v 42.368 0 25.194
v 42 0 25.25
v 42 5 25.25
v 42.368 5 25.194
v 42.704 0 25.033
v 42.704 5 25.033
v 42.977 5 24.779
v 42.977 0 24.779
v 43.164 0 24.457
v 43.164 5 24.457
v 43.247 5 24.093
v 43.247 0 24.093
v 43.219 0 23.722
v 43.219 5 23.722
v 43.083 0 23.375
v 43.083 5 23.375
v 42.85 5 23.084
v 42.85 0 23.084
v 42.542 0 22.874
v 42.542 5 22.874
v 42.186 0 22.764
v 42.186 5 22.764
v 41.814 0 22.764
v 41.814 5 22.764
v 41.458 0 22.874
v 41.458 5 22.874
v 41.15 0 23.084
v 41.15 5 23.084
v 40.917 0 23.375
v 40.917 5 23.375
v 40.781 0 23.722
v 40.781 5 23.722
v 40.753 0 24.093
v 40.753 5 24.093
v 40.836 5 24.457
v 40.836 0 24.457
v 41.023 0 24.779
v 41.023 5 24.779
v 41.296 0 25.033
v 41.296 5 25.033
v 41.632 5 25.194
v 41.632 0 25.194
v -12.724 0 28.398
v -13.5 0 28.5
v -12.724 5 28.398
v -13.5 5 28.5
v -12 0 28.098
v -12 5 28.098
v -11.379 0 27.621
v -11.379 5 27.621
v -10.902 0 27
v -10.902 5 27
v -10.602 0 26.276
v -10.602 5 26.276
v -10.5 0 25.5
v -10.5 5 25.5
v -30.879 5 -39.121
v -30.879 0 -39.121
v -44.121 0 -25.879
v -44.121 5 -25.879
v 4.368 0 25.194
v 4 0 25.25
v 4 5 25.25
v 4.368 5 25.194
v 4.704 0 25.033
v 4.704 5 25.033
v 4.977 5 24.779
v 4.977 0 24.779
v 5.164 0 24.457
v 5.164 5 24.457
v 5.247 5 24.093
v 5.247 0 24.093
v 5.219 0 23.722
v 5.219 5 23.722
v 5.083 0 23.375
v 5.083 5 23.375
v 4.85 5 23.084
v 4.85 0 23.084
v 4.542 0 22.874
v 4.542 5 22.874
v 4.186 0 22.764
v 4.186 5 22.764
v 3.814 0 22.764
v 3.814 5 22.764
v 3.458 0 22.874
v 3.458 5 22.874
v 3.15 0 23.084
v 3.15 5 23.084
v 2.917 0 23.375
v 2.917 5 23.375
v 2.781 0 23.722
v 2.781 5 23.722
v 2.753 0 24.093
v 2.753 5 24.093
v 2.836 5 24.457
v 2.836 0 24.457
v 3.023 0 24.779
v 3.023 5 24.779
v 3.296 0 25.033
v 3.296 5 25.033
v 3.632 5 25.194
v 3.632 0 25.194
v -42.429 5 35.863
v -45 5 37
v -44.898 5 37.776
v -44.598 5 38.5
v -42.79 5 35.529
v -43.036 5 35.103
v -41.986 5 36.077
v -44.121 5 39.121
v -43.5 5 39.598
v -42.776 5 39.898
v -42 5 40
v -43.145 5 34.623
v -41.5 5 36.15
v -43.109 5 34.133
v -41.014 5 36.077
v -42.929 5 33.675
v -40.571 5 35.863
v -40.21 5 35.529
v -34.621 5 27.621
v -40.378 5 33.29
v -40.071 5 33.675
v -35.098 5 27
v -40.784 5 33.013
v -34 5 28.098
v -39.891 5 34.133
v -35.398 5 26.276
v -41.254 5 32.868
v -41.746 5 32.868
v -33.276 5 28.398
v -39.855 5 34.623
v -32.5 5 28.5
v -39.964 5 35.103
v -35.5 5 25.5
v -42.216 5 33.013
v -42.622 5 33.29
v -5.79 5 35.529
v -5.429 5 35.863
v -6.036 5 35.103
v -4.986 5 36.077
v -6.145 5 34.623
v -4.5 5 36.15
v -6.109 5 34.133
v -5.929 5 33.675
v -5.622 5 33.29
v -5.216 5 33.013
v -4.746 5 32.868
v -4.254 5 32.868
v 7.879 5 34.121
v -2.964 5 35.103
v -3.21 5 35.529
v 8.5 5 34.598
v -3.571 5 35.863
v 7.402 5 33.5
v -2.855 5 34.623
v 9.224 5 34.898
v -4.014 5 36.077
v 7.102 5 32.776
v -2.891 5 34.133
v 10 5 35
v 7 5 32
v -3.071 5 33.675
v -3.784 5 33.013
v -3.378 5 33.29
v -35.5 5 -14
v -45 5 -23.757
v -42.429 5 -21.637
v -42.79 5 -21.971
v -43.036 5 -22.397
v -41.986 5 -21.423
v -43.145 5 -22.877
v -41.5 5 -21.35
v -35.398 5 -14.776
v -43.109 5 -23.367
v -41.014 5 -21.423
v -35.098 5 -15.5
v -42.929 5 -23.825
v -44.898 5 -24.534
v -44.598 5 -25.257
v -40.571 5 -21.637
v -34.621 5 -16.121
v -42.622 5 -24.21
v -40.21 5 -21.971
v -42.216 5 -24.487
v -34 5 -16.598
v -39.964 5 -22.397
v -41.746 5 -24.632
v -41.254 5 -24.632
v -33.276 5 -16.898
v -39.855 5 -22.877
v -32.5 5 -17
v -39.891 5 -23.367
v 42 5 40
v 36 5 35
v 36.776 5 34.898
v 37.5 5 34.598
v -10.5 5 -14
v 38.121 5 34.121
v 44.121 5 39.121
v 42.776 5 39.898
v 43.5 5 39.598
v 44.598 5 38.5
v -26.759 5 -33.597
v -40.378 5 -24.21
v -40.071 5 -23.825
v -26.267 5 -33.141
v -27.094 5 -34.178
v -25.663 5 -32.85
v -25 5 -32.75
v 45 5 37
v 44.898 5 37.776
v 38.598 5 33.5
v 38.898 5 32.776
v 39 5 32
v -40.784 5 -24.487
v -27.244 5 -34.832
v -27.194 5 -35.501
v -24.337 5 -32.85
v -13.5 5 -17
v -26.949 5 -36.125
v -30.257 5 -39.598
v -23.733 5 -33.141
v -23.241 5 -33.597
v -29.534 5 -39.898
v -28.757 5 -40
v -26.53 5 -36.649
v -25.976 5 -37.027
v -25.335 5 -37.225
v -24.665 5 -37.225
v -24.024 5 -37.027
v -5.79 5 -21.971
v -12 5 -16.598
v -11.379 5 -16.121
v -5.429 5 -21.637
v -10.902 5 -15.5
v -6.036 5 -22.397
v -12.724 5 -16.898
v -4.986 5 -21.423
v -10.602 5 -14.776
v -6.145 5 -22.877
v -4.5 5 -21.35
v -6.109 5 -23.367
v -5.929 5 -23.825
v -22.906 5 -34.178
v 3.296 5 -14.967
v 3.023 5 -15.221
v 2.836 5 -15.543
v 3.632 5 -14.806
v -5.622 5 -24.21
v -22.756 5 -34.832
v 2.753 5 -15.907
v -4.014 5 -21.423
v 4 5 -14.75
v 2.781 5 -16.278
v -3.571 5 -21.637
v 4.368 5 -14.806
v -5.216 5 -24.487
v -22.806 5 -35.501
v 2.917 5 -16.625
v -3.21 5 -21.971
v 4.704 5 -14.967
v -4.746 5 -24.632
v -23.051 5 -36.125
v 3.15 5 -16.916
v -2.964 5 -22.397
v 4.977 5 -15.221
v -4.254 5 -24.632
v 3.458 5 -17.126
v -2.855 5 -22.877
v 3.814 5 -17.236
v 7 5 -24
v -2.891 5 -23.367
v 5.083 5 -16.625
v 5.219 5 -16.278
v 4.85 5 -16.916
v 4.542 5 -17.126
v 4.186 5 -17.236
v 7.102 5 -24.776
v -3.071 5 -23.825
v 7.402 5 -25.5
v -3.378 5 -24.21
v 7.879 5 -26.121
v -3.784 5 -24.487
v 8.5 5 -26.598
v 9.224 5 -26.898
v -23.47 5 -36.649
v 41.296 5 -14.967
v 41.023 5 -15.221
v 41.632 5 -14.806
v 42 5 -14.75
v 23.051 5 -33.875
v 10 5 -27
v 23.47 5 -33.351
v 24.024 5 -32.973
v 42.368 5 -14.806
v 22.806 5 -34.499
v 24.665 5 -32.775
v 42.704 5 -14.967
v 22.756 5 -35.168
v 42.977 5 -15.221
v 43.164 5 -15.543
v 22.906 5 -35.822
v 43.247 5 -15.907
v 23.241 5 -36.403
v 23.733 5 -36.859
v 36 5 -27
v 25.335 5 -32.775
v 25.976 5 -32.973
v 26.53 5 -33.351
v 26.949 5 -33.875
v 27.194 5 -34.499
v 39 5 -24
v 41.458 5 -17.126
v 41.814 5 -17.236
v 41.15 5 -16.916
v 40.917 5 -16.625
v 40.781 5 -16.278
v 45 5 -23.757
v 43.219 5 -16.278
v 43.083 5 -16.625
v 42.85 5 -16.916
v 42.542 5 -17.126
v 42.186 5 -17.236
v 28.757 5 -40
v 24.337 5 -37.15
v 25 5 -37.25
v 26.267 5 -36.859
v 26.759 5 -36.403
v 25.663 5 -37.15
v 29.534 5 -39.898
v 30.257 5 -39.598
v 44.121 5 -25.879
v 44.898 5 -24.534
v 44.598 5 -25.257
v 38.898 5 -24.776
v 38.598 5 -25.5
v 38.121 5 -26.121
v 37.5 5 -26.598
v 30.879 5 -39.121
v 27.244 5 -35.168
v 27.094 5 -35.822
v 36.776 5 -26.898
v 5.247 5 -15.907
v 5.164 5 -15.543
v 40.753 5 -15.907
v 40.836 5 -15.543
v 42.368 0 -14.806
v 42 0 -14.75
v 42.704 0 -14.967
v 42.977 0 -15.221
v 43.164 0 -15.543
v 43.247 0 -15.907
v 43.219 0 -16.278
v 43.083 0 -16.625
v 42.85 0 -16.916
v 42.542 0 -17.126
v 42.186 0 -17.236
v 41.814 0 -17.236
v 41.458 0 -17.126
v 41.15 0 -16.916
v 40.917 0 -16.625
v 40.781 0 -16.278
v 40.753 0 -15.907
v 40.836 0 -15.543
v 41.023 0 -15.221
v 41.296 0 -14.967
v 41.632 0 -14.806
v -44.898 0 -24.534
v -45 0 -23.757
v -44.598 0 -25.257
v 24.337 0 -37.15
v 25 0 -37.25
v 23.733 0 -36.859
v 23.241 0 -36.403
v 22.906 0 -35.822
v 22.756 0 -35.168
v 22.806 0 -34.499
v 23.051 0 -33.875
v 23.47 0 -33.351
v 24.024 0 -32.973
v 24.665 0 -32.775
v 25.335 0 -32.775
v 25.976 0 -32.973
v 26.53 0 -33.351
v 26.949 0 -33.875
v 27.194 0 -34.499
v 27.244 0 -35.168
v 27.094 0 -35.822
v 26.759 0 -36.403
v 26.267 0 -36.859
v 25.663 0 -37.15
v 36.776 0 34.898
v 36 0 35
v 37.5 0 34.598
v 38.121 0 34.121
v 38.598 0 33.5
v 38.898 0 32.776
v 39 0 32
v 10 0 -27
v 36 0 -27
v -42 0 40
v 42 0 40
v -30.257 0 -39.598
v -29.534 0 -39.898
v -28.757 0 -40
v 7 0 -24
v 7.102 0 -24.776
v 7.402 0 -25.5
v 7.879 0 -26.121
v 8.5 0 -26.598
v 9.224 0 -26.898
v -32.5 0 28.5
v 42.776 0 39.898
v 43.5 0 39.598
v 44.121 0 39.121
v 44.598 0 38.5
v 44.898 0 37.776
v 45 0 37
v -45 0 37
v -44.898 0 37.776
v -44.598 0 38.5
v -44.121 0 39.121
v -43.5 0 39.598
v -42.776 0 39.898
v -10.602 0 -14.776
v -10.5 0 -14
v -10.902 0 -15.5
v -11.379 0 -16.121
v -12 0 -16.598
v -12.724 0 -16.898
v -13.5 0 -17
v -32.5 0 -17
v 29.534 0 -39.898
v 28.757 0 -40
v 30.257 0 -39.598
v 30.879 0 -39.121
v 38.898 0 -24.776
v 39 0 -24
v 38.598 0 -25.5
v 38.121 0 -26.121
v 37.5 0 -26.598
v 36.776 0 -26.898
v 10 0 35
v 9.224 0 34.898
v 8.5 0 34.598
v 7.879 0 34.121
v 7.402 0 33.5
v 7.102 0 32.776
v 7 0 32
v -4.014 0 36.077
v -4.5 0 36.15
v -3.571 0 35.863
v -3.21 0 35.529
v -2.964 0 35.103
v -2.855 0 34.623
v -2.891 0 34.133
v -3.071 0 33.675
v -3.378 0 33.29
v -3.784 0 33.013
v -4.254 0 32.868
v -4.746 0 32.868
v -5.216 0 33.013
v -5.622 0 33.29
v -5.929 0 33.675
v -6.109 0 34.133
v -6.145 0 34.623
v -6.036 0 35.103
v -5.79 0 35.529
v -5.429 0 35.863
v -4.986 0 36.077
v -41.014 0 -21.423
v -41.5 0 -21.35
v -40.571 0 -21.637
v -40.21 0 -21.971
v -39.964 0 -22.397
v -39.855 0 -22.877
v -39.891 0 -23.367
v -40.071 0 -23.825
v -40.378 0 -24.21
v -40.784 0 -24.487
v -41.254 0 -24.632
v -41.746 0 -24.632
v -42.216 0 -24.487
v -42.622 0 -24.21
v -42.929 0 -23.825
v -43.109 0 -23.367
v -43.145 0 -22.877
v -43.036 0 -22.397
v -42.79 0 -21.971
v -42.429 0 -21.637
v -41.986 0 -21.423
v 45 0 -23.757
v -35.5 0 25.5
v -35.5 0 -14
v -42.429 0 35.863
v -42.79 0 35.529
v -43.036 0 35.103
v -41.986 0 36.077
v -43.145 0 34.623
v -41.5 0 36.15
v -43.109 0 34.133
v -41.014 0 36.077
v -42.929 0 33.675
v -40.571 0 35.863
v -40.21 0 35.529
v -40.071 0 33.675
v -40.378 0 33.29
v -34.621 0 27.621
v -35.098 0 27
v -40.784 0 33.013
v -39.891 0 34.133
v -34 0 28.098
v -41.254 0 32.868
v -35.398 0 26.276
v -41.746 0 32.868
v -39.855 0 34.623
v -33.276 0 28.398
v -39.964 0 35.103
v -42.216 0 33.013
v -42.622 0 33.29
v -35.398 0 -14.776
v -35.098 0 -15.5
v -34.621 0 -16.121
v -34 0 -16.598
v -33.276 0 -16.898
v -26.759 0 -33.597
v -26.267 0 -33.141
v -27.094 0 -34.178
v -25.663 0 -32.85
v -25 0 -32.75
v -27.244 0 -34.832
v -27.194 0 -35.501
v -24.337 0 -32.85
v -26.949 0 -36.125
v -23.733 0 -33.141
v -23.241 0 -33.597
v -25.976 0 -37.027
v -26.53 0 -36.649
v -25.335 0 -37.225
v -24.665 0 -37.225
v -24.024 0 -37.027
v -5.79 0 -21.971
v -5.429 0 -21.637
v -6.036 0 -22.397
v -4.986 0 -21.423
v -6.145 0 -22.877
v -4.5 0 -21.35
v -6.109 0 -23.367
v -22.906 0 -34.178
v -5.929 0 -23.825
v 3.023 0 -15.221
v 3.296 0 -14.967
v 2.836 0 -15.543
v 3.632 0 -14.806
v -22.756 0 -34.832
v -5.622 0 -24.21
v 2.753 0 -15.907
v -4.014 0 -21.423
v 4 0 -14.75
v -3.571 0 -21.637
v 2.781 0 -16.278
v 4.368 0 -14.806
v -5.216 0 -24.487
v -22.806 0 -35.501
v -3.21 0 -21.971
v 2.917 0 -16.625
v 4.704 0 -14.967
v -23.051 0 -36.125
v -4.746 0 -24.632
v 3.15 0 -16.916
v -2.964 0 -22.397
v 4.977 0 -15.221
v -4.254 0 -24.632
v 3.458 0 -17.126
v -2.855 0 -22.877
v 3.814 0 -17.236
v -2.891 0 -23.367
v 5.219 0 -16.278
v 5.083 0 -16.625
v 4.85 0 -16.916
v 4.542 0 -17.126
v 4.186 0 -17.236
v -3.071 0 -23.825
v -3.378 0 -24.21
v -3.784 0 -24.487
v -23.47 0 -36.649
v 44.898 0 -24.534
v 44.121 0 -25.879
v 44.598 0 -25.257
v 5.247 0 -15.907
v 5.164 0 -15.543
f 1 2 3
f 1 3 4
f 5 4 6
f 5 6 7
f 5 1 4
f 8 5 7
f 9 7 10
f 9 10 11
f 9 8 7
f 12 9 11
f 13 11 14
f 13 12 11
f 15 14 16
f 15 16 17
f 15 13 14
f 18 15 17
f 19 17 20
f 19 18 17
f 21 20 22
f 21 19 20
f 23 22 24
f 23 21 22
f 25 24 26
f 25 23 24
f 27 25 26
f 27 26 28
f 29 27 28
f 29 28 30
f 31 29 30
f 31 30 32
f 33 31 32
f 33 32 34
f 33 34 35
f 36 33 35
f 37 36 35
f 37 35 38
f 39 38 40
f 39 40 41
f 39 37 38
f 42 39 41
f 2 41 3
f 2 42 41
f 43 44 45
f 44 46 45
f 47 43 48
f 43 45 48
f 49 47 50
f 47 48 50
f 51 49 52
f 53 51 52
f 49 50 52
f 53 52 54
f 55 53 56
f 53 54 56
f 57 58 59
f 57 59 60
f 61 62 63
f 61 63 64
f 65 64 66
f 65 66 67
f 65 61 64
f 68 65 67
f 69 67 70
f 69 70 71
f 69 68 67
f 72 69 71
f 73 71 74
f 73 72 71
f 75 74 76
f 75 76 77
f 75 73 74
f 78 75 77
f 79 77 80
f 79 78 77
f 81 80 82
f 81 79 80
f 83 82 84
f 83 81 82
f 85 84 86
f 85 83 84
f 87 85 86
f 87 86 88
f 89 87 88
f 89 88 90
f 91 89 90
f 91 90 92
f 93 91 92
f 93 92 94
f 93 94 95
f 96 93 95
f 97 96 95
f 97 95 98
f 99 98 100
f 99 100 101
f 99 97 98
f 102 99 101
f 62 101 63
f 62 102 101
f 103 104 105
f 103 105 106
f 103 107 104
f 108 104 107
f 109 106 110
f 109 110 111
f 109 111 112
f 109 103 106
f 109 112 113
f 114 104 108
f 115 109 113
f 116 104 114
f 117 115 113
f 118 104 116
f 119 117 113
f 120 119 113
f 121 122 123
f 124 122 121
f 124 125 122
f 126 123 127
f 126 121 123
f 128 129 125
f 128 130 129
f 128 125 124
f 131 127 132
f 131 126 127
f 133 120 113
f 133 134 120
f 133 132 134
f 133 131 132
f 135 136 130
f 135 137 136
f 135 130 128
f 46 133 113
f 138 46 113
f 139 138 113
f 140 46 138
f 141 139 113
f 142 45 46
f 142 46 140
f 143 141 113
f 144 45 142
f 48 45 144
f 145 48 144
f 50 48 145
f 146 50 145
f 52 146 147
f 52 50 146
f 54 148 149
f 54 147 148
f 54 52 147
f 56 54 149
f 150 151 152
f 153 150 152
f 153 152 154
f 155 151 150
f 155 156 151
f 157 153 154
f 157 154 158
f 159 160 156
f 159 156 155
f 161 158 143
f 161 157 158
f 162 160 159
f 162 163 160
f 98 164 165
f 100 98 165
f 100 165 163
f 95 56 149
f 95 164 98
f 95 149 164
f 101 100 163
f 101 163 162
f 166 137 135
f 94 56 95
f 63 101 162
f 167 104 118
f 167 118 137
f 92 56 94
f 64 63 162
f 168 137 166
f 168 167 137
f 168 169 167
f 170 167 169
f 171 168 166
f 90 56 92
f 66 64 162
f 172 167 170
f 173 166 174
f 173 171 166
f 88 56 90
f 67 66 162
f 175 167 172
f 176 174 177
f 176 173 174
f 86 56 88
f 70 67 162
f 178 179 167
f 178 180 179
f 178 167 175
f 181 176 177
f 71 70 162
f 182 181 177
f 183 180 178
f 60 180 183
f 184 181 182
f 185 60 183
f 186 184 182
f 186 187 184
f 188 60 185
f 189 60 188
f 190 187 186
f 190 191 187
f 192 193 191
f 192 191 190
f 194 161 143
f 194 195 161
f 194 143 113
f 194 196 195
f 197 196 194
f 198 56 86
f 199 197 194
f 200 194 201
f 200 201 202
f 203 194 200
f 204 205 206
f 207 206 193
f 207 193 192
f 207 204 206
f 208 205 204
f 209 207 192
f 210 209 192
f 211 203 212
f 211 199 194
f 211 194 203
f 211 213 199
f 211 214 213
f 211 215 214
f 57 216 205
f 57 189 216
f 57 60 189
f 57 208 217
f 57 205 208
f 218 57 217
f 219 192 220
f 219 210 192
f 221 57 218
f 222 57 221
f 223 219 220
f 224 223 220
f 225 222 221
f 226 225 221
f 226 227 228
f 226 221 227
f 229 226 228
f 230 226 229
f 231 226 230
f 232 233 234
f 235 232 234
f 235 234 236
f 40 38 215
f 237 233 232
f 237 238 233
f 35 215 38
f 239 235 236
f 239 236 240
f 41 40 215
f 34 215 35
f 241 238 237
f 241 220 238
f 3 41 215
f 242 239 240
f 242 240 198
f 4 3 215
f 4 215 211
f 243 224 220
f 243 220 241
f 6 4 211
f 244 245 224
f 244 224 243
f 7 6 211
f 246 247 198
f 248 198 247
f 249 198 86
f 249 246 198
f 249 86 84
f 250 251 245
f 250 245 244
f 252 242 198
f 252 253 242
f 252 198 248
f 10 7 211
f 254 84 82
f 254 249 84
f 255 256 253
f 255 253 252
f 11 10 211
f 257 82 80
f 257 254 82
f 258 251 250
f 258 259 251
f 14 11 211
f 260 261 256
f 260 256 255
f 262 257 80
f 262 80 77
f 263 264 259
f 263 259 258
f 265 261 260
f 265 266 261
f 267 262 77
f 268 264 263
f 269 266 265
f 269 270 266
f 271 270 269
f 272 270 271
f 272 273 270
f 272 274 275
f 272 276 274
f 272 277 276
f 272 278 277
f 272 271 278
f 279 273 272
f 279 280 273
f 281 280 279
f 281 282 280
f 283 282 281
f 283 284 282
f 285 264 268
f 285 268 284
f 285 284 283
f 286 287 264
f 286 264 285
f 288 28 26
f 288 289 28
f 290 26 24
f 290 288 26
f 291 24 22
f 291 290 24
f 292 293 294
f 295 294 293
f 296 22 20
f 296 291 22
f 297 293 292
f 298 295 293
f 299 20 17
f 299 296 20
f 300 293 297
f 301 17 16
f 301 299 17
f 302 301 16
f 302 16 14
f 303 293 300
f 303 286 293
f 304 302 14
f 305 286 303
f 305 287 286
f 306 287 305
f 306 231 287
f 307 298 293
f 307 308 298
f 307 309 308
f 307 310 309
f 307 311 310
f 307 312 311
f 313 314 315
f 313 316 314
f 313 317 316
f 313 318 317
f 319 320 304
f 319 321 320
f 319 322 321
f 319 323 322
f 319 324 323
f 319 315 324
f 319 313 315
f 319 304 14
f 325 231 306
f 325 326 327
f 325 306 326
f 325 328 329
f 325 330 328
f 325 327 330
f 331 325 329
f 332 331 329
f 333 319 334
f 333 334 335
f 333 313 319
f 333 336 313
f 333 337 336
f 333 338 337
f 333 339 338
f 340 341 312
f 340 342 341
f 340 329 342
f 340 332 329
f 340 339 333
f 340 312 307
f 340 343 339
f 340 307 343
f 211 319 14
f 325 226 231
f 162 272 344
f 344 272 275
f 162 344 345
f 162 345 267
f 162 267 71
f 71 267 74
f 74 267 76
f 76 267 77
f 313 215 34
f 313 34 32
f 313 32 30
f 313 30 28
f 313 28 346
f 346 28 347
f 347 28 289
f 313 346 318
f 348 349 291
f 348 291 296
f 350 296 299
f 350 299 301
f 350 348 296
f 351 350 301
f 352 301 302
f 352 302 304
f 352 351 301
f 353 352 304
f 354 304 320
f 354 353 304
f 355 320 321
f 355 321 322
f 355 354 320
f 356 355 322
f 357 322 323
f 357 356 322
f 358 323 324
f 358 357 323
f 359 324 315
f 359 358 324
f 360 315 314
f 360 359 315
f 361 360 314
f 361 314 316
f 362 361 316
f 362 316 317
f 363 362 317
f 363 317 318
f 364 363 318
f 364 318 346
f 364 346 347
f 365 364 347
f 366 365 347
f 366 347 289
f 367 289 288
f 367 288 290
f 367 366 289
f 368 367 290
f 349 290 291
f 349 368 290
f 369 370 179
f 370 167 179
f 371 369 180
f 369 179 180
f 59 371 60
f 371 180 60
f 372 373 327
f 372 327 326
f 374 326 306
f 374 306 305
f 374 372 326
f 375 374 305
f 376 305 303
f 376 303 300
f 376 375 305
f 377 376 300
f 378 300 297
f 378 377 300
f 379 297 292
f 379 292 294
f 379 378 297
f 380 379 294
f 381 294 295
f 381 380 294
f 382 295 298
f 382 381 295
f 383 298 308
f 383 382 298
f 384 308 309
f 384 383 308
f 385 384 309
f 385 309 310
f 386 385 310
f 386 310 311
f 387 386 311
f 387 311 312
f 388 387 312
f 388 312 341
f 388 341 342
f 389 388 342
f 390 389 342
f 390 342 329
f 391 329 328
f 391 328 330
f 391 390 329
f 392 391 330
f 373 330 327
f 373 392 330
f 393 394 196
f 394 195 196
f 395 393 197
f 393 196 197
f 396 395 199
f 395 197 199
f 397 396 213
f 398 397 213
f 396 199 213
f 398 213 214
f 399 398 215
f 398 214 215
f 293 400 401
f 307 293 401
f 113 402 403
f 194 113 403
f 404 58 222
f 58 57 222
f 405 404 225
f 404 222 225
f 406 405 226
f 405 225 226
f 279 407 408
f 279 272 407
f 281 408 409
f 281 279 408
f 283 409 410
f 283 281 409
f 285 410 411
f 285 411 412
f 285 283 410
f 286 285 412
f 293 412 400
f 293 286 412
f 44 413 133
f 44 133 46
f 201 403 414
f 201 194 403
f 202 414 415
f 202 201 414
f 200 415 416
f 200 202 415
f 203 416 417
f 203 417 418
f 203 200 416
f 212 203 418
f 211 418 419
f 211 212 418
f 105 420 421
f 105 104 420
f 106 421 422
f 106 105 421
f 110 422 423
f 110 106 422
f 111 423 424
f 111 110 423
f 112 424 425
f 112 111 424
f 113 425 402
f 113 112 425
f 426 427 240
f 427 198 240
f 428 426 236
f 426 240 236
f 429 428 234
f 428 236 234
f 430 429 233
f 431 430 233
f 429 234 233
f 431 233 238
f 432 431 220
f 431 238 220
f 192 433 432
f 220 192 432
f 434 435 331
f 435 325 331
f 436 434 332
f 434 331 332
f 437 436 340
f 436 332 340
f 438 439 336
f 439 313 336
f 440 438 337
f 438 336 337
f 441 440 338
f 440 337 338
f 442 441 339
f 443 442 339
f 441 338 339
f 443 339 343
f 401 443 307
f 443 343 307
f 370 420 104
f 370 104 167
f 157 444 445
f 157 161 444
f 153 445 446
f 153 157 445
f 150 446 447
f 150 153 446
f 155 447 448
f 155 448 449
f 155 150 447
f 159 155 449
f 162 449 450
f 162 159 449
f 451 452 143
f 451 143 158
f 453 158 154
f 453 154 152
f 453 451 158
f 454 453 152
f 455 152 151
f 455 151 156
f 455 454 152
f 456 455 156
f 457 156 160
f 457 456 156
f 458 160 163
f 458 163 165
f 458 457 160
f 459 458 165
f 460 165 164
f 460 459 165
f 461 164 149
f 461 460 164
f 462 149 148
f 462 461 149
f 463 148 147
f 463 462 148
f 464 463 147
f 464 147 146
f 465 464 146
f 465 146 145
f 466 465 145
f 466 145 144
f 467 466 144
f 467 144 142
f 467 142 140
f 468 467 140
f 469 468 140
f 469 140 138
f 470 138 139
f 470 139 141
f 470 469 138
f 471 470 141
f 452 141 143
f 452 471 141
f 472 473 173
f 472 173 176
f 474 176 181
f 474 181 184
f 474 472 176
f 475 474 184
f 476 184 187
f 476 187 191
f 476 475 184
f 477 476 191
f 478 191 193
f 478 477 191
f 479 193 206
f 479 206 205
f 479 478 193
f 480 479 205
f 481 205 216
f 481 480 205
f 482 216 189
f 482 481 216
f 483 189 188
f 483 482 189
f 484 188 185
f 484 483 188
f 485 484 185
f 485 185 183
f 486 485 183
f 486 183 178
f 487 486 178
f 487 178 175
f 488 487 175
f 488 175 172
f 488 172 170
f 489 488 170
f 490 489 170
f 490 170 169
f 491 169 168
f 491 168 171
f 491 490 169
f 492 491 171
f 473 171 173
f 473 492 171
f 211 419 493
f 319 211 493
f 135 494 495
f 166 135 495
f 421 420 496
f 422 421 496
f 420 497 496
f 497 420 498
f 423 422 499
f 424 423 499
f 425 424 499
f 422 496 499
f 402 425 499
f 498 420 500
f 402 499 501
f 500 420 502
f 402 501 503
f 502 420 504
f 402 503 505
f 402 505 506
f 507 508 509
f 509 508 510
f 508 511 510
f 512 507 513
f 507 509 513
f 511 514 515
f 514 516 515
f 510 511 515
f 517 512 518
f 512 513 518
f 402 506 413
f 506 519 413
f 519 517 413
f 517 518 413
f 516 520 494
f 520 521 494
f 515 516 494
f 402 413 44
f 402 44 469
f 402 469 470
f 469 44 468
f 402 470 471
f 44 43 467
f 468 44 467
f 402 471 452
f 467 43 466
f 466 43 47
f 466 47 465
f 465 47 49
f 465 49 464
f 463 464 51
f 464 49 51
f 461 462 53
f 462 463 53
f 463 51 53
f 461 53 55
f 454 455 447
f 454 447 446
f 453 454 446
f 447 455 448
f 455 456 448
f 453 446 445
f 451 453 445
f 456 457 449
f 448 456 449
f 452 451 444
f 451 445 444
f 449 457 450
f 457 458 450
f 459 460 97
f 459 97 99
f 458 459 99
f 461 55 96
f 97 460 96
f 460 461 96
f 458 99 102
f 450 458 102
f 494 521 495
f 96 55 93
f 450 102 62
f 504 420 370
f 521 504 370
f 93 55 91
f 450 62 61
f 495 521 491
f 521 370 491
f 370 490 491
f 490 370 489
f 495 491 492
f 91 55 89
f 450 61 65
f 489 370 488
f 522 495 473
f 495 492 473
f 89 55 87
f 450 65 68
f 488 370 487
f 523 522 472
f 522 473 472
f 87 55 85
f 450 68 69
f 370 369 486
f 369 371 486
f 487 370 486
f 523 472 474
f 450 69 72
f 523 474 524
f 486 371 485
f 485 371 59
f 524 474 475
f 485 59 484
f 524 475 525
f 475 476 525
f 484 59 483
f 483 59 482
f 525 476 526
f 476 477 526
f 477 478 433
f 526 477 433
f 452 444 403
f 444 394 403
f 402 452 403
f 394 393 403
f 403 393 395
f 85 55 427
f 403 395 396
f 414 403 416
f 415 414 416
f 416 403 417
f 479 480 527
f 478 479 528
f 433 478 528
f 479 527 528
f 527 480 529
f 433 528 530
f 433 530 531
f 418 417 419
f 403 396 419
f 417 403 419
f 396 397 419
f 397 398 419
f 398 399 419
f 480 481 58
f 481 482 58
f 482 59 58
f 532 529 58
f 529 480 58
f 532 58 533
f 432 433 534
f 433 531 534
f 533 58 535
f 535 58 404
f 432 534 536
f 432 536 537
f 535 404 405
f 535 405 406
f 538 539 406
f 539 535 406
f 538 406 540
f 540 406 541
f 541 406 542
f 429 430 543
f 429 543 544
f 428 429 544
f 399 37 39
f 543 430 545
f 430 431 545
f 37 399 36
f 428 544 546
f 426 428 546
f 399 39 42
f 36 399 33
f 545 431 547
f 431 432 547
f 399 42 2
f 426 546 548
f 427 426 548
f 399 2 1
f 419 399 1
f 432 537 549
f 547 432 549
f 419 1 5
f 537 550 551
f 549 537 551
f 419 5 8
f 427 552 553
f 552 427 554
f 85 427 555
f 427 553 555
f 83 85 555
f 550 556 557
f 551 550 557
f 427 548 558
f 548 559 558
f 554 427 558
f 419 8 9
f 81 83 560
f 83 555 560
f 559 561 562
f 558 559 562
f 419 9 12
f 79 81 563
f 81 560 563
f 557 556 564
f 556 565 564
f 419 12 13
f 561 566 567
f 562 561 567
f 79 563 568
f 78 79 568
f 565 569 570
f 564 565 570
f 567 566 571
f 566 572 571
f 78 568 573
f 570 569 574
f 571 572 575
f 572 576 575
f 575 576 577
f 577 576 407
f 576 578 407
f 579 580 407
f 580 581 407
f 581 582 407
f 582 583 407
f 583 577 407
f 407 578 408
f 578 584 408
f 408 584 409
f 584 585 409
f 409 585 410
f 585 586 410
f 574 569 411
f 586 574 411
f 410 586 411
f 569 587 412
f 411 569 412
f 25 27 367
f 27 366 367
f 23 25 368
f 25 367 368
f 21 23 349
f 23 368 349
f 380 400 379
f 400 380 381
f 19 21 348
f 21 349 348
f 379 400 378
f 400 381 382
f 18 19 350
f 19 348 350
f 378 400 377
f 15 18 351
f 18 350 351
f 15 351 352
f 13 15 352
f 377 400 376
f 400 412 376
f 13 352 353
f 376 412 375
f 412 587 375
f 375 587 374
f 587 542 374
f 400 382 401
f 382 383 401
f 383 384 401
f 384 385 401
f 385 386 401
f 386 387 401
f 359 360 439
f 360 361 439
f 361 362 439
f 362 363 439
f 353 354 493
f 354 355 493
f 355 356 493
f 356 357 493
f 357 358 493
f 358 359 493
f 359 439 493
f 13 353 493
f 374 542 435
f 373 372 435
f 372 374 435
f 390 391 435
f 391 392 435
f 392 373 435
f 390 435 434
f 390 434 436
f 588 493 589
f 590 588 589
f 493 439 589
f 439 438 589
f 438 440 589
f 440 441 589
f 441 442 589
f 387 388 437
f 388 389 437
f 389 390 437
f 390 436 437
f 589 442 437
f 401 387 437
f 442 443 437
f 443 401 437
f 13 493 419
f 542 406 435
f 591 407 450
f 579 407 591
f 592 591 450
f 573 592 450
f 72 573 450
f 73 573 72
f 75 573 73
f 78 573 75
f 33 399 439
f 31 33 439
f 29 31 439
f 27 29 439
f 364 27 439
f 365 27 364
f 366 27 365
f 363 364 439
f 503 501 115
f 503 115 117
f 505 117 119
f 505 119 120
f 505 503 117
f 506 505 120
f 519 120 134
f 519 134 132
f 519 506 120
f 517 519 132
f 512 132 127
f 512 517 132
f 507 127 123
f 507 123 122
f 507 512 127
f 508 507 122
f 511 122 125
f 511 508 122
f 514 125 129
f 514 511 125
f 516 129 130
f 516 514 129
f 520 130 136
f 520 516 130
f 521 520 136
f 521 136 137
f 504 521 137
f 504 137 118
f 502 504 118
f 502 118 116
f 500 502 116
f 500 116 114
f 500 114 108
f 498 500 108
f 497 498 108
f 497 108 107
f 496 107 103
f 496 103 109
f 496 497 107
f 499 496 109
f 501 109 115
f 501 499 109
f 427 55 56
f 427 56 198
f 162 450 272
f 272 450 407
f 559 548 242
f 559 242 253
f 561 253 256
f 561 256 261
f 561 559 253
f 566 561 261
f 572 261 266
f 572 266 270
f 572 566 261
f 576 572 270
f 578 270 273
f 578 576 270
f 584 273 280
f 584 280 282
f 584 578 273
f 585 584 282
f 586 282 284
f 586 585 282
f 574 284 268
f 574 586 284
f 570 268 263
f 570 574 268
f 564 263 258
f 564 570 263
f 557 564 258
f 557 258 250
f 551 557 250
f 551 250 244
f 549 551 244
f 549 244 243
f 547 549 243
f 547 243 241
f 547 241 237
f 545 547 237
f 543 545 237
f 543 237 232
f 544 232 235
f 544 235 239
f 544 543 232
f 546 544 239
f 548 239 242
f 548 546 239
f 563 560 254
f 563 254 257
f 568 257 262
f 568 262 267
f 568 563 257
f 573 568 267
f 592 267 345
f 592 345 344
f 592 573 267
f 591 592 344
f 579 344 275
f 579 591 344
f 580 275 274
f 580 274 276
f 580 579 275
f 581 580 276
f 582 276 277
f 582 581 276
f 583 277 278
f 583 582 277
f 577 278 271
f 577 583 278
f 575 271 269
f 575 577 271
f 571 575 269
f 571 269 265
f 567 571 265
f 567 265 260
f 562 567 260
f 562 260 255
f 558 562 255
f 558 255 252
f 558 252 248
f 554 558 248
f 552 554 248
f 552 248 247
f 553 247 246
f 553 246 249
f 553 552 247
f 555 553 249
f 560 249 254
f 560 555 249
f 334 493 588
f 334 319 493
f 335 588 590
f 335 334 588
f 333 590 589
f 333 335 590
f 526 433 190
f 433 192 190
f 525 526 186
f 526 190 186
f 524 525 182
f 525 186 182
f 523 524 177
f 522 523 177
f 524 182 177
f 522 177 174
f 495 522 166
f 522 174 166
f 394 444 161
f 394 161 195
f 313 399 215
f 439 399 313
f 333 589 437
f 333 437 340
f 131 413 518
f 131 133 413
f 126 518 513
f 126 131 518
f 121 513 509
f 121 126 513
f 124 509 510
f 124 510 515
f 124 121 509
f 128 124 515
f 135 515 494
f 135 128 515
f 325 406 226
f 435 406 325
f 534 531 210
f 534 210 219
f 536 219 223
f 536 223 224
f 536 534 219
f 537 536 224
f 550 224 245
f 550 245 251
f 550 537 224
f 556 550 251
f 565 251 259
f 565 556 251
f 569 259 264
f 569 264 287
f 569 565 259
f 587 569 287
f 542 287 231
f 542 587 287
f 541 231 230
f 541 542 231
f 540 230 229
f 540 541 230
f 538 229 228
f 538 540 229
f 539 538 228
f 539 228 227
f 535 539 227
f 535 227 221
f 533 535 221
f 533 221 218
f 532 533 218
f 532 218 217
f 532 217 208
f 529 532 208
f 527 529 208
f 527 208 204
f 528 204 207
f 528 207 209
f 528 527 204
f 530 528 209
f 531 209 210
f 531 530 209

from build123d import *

# Parameters (mm, degrees)
SKETCH1_W           = 90
SKETCH1_H           = 80
SKETCH1_R           = 2.25
SKETCH1_R_2         = 1.65
SKETCH1_R_3         = 1.25
SKETCH1_W_2         = 32
SKETCH1_H_2         = 62
SKETCH1_W_3         = 25
SKETCH1_H_3         = 45.5
BOSS_EXTRUDE1_DEPTH = 5
CHAMFER1_SIZE       = 15
FILLET1_R           = 3


with BuildPart() as part:
    # Sketch1 → Boss-Extrude1 (new body)
    with BuildSketch(Plane(origin=(0, 0, 0), x_dir=(1, 0, 0), z_dir=(0, 1, 0))):
        Rectangle(SKETCH1_W, SKETCH1_H)
        with Locations(Location((-25, 35, 0), (0, 0, 270))):
            Circle(SKETCH1_R, mode=Mode.SUBTRACT)
        with Locations(Location((25, 35, 0), (0, 0, 90))):
            Circle(SKETCH1_R, mode=Mode.SUBTRACT)
        with Locations(Location((-41.5, 23, 0), (0, 0, 270))):
            Circle(SKETCH1_R_2, mode=Mode.SUBTRACT)
        with Locations(Location((-4.5, 23, 0), (0, 0, 270))):
            Circle(SKETCH1_R_2, mode=Mode.SUBTRACT)
        with Locations(Location((-4.5, -34.5, 0), (0, 0, 270))):
            Circle(SKETCH1_R_2, mode=Mode.SUBTRACT)
        with Locations(Location((-41.5, -34.5, 0), (0, 0, 270))):
            Circle(SKETCH1_R_2, mode=Mode.SUBTRACT)
        with Locations(Location((4, 16, 0), (0, 0, 270))):
            Circle(SKETCH1_R_3, mode=Mode.SUBTRACT)
        with Locations(Location((42, 16, 0), (0, 0, 270))):
            Circle(SKETCH1_R_3, mode=Mode.SUBTRACT)
        with Locations(Location((42, -24, 0), (0, 0, 270))):
            Circle(SKETCH1_R_3, mode=Mode.SUBTRACT)
        with Locations(Location((4, -24, 0), (0, 0, 270))):
            Circle(SKETCH1_R_3, mode=Mode.SUBTRACT)
        with Locations((23, -4)):
            Rectangle(SKETCH1_W_2, SKETCH1_H_2, mode=Mode.SUBTRACT)
        with Locations((-23, -5.75)):
            Rectangle(SKETCH1_W_3, SKETCH1_H_3, mode=Mode.SUBTRACT)
    extrude(amount=BOSS_EXTRUDE1_DEPTH)

    # Chamfer1
    chamfer1_edges = [part.edges().sort_by_distance(p)[0] for p in [
        (-45, 2.5, -40),
        (45, 2.5, -40),
    ]]
    chamfer(chamfer1_edges, length=CHAMFER1_SIZE)

    # Fillet1
    fillet1_edges = [part.edges().sort_by_distance(p)[0] for p in [
        (7, 2.5, -27),
        (7, 2.5, 35),
        (39, 2.5, 35),
        (39, 2.5, -27),
        (-35.5, 2.5, -17),
        (-35.5, 2.5, 28.5),
        (-10.5, 2.5, 28.5),
        (-10.5, 2.5, -17),
        (45, 2.5, 40),
        (-45, 2.5, 40),
        (-30, 2.5, -40),
        (30, 2.5, -40),
        (45, 2.5, -25),
        (-45, 2.5, -25),
    ]]
    fillet(fillet1_edges, radius=FILLET1_R)


solid = part.part
